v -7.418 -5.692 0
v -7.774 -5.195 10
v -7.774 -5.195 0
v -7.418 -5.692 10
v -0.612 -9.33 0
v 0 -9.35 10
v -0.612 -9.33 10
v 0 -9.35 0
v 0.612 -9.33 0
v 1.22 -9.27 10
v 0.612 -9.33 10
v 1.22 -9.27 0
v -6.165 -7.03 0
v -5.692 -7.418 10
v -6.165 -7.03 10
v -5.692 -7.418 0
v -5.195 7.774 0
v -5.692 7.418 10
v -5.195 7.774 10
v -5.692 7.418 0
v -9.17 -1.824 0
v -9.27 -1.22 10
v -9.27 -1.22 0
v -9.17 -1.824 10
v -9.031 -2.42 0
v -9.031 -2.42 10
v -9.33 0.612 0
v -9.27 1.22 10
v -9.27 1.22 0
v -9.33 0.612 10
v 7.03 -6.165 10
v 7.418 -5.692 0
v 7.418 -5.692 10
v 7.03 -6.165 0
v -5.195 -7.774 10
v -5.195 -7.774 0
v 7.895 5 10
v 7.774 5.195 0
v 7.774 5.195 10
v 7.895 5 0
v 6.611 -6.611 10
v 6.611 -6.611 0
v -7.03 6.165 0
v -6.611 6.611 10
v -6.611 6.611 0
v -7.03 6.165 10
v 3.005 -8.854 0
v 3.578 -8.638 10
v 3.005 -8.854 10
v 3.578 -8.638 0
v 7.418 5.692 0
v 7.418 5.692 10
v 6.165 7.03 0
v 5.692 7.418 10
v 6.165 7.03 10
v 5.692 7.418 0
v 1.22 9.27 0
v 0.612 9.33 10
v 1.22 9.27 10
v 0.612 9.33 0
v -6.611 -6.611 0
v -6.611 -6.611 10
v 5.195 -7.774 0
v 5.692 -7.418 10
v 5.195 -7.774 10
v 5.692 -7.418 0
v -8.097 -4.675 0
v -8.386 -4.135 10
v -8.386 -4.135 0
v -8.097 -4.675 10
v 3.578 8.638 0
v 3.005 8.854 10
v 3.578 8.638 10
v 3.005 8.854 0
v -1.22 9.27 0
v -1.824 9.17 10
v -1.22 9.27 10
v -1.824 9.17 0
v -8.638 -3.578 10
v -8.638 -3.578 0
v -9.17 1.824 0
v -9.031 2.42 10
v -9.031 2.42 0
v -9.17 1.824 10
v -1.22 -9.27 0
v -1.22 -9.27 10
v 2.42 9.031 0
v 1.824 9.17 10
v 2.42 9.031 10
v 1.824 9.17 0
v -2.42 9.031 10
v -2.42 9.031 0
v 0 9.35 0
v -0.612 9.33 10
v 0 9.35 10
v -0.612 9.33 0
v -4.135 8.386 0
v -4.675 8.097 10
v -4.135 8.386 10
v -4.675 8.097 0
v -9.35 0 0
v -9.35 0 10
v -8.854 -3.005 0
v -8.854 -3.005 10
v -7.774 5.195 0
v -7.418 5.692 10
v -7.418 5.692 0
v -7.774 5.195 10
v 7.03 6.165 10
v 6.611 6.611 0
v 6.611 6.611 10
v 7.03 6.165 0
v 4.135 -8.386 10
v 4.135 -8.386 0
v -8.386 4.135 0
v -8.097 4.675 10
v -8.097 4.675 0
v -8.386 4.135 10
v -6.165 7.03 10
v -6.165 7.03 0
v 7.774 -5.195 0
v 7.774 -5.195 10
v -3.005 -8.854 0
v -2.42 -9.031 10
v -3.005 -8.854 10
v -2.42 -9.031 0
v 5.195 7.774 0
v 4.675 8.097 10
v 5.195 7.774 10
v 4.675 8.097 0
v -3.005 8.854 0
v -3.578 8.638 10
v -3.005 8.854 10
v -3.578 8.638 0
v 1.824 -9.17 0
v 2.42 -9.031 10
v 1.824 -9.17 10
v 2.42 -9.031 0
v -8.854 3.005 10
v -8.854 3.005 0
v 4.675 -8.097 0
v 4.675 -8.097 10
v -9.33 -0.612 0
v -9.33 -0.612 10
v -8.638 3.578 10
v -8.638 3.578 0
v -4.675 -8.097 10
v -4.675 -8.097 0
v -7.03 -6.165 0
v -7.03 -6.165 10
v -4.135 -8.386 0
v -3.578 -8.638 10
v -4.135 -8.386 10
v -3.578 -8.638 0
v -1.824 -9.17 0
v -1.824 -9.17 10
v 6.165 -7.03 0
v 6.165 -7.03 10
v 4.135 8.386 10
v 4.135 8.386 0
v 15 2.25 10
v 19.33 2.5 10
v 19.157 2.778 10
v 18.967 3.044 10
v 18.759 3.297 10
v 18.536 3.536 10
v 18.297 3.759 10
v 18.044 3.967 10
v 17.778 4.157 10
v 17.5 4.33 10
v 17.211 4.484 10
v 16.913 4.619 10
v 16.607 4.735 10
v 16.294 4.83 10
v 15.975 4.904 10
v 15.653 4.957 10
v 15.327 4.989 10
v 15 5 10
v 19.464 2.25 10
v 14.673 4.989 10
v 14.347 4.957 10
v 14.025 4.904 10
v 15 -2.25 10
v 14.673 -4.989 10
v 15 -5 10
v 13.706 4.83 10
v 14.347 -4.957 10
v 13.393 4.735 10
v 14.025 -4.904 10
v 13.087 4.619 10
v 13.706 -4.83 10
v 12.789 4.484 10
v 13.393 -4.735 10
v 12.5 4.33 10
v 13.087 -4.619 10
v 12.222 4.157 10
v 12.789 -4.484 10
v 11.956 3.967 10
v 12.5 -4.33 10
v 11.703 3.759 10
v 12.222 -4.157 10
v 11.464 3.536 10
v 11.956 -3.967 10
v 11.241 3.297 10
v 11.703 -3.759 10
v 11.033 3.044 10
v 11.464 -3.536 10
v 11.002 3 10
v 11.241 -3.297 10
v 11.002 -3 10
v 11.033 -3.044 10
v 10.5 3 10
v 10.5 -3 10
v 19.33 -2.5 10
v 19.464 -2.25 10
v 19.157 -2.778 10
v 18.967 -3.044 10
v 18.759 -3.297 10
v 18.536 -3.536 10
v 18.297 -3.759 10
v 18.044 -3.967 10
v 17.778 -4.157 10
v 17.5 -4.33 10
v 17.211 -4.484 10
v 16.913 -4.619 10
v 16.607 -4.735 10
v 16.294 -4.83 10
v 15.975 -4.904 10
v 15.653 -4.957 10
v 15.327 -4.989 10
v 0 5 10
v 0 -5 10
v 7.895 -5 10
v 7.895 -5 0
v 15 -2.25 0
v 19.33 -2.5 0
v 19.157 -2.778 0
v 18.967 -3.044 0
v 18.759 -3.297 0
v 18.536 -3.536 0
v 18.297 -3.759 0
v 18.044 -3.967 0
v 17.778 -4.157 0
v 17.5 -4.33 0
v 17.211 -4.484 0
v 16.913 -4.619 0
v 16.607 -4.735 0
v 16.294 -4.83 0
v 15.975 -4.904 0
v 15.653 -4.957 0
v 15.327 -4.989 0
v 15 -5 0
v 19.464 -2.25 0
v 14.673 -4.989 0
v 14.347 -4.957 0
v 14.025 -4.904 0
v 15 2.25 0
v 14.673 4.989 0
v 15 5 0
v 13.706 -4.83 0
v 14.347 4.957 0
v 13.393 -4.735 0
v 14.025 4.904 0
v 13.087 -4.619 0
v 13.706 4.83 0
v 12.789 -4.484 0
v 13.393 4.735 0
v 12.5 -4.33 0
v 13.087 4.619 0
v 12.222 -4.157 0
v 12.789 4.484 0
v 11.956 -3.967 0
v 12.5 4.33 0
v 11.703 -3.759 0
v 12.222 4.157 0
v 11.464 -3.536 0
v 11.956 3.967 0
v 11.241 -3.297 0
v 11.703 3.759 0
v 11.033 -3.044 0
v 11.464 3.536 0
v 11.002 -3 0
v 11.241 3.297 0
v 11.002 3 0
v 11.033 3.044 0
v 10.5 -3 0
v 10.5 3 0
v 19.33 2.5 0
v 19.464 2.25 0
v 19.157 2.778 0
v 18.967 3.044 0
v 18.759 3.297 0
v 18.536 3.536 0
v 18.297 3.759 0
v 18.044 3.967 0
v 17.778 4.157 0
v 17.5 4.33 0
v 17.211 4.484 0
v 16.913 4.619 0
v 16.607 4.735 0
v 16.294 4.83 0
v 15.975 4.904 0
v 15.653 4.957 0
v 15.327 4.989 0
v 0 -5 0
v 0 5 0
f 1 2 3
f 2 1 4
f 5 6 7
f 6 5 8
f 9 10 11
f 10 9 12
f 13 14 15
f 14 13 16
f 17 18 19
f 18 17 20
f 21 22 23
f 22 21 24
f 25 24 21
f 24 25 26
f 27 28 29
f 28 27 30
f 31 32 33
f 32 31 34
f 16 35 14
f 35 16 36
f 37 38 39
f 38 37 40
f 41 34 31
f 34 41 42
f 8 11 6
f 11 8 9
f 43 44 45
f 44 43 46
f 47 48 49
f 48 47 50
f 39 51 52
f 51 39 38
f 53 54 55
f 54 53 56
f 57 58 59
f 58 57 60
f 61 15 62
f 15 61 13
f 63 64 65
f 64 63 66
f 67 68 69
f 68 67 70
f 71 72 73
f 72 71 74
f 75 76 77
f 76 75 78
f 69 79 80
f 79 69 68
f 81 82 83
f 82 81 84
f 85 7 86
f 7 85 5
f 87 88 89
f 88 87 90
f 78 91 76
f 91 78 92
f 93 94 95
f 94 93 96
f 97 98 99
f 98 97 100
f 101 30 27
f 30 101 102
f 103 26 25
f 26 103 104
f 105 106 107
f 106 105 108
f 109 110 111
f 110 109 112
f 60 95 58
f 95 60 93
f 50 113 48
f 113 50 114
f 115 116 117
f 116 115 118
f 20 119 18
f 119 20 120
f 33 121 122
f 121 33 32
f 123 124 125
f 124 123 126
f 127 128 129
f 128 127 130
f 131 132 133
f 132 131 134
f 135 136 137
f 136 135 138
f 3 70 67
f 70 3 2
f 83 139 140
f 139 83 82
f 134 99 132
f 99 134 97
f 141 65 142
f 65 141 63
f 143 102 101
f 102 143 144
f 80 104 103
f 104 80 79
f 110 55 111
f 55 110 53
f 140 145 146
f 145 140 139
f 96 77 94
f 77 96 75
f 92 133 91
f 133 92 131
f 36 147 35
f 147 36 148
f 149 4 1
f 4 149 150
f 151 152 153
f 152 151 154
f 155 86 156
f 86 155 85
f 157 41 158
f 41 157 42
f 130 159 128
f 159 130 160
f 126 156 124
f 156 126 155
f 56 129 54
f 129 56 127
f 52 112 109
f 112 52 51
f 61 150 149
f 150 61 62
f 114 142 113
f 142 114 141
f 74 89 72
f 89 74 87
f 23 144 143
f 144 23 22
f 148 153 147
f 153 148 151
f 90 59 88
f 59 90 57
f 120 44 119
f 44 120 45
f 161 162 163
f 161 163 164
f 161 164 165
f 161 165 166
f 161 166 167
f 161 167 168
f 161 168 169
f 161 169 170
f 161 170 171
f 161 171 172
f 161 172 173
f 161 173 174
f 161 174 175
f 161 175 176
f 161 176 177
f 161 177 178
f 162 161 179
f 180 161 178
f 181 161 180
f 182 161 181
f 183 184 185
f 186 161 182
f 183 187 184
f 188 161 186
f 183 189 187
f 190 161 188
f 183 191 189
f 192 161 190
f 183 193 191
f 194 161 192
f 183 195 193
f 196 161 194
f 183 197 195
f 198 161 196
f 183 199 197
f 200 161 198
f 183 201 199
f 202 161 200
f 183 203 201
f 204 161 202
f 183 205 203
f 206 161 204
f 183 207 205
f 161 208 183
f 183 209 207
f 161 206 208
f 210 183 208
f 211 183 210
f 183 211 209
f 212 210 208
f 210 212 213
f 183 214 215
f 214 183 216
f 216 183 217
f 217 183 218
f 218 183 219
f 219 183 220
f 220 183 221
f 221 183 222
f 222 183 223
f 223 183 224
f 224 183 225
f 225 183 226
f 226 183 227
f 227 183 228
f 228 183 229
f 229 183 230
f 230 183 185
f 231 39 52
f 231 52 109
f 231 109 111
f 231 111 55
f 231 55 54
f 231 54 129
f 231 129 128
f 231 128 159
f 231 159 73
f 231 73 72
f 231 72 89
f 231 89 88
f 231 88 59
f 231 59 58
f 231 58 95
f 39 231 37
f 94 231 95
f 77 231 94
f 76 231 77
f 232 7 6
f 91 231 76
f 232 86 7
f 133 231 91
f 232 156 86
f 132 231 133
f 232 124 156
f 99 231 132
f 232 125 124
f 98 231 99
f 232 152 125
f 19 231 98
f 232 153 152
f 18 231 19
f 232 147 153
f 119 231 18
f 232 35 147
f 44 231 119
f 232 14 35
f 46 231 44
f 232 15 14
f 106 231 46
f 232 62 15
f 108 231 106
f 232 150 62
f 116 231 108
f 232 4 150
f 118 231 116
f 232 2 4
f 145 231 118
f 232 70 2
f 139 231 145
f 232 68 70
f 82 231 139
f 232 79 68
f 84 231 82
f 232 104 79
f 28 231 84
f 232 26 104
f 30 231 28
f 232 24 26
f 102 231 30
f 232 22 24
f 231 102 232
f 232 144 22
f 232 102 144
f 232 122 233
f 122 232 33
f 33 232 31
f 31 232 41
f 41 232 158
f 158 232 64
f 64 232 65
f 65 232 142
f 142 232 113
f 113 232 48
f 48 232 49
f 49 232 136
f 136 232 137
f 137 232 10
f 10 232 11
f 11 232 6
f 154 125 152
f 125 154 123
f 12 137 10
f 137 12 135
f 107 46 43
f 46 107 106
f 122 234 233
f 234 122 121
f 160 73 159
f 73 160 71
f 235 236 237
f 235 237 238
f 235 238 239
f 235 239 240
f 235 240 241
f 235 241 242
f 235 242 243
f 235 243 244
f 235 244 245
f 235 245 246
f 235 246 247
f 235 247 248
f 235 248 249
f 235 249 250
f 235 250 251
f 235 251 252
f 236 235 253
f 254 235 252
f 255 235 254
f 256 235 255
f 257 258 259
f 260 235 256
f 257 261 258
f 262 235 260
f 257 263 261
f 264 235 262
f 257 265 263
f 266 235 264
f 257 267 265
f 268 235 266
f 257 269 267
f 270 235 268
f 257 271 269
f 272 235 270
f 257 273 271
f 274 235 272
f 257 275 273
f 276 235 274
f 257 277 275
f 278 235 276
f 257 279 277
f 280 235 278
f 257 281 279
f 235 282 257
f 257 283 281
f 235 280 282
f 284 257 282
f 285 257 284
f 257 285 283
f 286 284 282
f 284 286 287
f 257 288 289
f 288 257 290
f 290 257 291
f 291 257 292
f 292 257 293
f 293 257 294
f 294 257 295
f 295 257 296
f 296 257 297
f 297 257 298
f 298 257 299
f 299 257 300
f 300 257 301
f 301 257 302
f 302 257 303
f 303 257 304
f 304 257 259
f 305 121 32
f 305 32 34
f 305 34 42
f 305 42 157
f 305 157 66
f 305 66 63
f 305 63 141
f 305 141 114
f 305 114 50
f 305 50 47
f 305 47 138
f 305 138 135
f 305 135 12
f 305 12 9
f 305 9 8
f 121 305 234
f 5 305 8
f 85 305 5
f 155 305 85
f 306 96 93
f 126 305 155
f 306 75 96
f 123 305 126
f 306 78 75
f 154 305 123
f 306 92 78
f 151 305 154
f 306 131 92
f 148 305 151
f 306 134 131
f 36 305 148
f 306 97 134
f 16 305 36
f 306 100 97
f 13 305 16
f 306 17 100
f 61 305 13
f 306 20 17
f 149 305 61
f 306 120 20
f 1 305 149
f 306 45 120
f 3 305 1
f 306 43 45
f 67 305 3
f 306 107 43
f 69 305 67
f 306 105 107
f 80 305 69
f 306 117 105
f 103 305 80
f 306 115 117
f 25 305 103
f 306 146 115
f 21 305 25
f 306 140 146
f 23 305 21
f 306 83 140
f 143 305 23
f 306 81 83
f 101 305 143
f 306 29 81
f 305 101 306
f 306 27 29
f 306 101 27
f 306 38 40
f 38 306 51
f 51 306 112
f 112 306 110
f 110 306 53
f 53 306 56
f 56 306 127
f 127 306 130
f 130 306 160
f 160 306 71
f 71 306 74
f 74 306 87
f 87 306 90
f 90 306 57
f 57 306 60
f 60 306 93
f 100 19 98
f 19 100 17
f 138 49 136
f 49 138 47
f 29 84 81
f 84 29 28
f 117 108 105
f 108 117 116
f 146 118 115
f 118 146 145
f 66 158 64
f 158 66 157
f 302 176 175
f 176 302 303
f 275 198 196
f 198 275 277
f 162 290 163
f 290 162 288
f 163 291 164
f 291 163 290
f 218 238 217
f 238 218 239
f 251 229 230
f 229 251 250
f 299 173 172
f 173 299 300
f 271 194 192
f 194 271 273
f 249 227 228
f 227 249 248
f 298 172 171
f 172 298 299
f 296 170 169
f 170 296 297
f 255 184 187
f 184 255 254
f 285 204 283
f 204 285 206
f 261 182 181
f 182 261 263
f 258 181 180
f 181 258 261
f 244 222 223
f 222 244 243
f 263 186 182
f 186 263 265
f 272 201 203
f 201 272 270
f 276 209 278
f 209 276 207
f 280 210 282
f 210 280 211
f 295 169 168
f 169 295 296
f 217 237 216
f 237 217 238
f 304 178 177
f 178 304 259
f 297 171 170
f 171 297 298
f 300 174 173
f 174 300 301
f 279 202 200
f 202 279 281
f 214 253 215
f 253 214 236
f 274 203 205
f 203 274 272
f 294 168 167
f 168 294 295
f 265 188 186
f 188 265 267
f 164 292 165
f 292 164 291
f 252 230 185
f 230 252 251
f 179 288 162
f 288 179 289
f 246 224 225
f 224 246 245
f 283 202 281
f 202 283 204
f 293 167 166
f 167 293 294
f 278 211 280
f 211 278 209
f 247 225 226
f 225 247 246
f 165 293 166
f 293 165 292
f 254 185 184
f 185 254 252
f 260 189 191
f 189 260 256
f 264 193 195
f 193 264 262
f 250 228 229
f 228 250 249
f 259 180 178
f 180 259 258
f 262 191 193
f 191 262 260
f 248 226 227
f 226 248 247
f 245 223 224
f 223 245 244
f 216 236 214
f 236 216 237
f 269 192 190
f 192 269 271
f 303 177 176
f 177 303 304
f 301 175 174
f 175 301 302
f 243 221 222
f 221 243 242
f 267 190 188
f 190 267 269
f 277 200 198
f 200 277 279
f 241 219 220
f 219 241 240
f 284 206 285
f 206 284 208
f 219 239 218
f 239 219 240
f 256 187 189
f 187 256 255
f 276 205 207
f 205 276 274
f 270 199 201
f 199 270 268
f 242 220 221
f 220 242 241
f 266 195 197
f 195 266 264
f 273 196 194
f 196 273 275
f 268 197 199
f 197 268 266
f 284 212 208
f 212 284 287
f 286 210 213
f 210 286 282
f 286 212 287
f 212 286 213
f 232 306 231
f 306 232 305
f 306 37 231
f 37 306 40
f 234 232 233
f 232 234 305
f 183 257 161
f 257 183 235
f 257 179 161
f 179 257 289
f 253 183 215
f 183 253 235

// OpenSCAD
// Snap-on tubing clip for a 12.7 mm (1/2 inch) lab stand rod
// Printed flat: extrusion of 2-D profile in XY plane, 10 mm tall (Z)
// Units: mm

$fn = 96;

// ---- Rod ring ----
rod_id     = 12.7;   // rod inner diameter
rod_wall   = 3;      // rod ring wall thickness
rod_od     = rod_id + 2 * rod_wall;  // 18.7 mm outer diameter
rod_h      = 10;     // extrusion height (Z)

// ---- Rod opening ----
rod_open_w = 10;     // opening width (X)
rod_open_y = 5;      // opening half-height in Y (-5 < y < 5)

// ---- Tubing ring ----
tube_id    = 6;      // tubing inner diameter
tube_wall  = 2;      // tubing ring wall thickness
tube_od    = tube_id + 2 * tube_wall; // 10 mm outer diameter
tube_x     = 15;     // tubing ring centre X
tube_h     = rod_h;  // extrusion height (Z)

// ---- Tubing opening ----
tube_open_w = 4.5;   // opening width (X)
tube_open_y = tube_open_w / 2; // 2.25 mm half-height in Y

// ---- Bridge ----
bridge_w   = 6;      // bridge width in Y
bridge_x0  = 8;      // bridge start X
bridge_x1  = 12;     // bridge end X

// ---- Cutting overlap ----
eps = 0.5;           // extension past cut faces

difference() {
    union() {
        // Rod ring
        cylinder(d = rod_od, h = rod_h);
        // Tubing ring
        translate([tube_x, 0, 0])
            cylinder(d = tube_od, h = tube_h);
        // Bridge between x = 8 and x = 12
        translate([bridge_x0, -bridge_w / 2, 0])
            cube([bridge_x1 - bridge_x0, bridge_w, rod_h]);
    }
    // Rod opening: x < 0 and -5 < y < 5
    translate([0, -rod_open_y, -eps])
        cube([rod_open_w + eps, 2 * rod_open_y, rod_h + 2 * eps]);
    // Tubing opening: x > 15 and -2.25 < y < 2.25
    translate([tube_x, -tube_open_y, -eps])
        cube([eps + rod_h + tube_x, 2 * tube_open_y, rod_h + 2 * eps]);
}
